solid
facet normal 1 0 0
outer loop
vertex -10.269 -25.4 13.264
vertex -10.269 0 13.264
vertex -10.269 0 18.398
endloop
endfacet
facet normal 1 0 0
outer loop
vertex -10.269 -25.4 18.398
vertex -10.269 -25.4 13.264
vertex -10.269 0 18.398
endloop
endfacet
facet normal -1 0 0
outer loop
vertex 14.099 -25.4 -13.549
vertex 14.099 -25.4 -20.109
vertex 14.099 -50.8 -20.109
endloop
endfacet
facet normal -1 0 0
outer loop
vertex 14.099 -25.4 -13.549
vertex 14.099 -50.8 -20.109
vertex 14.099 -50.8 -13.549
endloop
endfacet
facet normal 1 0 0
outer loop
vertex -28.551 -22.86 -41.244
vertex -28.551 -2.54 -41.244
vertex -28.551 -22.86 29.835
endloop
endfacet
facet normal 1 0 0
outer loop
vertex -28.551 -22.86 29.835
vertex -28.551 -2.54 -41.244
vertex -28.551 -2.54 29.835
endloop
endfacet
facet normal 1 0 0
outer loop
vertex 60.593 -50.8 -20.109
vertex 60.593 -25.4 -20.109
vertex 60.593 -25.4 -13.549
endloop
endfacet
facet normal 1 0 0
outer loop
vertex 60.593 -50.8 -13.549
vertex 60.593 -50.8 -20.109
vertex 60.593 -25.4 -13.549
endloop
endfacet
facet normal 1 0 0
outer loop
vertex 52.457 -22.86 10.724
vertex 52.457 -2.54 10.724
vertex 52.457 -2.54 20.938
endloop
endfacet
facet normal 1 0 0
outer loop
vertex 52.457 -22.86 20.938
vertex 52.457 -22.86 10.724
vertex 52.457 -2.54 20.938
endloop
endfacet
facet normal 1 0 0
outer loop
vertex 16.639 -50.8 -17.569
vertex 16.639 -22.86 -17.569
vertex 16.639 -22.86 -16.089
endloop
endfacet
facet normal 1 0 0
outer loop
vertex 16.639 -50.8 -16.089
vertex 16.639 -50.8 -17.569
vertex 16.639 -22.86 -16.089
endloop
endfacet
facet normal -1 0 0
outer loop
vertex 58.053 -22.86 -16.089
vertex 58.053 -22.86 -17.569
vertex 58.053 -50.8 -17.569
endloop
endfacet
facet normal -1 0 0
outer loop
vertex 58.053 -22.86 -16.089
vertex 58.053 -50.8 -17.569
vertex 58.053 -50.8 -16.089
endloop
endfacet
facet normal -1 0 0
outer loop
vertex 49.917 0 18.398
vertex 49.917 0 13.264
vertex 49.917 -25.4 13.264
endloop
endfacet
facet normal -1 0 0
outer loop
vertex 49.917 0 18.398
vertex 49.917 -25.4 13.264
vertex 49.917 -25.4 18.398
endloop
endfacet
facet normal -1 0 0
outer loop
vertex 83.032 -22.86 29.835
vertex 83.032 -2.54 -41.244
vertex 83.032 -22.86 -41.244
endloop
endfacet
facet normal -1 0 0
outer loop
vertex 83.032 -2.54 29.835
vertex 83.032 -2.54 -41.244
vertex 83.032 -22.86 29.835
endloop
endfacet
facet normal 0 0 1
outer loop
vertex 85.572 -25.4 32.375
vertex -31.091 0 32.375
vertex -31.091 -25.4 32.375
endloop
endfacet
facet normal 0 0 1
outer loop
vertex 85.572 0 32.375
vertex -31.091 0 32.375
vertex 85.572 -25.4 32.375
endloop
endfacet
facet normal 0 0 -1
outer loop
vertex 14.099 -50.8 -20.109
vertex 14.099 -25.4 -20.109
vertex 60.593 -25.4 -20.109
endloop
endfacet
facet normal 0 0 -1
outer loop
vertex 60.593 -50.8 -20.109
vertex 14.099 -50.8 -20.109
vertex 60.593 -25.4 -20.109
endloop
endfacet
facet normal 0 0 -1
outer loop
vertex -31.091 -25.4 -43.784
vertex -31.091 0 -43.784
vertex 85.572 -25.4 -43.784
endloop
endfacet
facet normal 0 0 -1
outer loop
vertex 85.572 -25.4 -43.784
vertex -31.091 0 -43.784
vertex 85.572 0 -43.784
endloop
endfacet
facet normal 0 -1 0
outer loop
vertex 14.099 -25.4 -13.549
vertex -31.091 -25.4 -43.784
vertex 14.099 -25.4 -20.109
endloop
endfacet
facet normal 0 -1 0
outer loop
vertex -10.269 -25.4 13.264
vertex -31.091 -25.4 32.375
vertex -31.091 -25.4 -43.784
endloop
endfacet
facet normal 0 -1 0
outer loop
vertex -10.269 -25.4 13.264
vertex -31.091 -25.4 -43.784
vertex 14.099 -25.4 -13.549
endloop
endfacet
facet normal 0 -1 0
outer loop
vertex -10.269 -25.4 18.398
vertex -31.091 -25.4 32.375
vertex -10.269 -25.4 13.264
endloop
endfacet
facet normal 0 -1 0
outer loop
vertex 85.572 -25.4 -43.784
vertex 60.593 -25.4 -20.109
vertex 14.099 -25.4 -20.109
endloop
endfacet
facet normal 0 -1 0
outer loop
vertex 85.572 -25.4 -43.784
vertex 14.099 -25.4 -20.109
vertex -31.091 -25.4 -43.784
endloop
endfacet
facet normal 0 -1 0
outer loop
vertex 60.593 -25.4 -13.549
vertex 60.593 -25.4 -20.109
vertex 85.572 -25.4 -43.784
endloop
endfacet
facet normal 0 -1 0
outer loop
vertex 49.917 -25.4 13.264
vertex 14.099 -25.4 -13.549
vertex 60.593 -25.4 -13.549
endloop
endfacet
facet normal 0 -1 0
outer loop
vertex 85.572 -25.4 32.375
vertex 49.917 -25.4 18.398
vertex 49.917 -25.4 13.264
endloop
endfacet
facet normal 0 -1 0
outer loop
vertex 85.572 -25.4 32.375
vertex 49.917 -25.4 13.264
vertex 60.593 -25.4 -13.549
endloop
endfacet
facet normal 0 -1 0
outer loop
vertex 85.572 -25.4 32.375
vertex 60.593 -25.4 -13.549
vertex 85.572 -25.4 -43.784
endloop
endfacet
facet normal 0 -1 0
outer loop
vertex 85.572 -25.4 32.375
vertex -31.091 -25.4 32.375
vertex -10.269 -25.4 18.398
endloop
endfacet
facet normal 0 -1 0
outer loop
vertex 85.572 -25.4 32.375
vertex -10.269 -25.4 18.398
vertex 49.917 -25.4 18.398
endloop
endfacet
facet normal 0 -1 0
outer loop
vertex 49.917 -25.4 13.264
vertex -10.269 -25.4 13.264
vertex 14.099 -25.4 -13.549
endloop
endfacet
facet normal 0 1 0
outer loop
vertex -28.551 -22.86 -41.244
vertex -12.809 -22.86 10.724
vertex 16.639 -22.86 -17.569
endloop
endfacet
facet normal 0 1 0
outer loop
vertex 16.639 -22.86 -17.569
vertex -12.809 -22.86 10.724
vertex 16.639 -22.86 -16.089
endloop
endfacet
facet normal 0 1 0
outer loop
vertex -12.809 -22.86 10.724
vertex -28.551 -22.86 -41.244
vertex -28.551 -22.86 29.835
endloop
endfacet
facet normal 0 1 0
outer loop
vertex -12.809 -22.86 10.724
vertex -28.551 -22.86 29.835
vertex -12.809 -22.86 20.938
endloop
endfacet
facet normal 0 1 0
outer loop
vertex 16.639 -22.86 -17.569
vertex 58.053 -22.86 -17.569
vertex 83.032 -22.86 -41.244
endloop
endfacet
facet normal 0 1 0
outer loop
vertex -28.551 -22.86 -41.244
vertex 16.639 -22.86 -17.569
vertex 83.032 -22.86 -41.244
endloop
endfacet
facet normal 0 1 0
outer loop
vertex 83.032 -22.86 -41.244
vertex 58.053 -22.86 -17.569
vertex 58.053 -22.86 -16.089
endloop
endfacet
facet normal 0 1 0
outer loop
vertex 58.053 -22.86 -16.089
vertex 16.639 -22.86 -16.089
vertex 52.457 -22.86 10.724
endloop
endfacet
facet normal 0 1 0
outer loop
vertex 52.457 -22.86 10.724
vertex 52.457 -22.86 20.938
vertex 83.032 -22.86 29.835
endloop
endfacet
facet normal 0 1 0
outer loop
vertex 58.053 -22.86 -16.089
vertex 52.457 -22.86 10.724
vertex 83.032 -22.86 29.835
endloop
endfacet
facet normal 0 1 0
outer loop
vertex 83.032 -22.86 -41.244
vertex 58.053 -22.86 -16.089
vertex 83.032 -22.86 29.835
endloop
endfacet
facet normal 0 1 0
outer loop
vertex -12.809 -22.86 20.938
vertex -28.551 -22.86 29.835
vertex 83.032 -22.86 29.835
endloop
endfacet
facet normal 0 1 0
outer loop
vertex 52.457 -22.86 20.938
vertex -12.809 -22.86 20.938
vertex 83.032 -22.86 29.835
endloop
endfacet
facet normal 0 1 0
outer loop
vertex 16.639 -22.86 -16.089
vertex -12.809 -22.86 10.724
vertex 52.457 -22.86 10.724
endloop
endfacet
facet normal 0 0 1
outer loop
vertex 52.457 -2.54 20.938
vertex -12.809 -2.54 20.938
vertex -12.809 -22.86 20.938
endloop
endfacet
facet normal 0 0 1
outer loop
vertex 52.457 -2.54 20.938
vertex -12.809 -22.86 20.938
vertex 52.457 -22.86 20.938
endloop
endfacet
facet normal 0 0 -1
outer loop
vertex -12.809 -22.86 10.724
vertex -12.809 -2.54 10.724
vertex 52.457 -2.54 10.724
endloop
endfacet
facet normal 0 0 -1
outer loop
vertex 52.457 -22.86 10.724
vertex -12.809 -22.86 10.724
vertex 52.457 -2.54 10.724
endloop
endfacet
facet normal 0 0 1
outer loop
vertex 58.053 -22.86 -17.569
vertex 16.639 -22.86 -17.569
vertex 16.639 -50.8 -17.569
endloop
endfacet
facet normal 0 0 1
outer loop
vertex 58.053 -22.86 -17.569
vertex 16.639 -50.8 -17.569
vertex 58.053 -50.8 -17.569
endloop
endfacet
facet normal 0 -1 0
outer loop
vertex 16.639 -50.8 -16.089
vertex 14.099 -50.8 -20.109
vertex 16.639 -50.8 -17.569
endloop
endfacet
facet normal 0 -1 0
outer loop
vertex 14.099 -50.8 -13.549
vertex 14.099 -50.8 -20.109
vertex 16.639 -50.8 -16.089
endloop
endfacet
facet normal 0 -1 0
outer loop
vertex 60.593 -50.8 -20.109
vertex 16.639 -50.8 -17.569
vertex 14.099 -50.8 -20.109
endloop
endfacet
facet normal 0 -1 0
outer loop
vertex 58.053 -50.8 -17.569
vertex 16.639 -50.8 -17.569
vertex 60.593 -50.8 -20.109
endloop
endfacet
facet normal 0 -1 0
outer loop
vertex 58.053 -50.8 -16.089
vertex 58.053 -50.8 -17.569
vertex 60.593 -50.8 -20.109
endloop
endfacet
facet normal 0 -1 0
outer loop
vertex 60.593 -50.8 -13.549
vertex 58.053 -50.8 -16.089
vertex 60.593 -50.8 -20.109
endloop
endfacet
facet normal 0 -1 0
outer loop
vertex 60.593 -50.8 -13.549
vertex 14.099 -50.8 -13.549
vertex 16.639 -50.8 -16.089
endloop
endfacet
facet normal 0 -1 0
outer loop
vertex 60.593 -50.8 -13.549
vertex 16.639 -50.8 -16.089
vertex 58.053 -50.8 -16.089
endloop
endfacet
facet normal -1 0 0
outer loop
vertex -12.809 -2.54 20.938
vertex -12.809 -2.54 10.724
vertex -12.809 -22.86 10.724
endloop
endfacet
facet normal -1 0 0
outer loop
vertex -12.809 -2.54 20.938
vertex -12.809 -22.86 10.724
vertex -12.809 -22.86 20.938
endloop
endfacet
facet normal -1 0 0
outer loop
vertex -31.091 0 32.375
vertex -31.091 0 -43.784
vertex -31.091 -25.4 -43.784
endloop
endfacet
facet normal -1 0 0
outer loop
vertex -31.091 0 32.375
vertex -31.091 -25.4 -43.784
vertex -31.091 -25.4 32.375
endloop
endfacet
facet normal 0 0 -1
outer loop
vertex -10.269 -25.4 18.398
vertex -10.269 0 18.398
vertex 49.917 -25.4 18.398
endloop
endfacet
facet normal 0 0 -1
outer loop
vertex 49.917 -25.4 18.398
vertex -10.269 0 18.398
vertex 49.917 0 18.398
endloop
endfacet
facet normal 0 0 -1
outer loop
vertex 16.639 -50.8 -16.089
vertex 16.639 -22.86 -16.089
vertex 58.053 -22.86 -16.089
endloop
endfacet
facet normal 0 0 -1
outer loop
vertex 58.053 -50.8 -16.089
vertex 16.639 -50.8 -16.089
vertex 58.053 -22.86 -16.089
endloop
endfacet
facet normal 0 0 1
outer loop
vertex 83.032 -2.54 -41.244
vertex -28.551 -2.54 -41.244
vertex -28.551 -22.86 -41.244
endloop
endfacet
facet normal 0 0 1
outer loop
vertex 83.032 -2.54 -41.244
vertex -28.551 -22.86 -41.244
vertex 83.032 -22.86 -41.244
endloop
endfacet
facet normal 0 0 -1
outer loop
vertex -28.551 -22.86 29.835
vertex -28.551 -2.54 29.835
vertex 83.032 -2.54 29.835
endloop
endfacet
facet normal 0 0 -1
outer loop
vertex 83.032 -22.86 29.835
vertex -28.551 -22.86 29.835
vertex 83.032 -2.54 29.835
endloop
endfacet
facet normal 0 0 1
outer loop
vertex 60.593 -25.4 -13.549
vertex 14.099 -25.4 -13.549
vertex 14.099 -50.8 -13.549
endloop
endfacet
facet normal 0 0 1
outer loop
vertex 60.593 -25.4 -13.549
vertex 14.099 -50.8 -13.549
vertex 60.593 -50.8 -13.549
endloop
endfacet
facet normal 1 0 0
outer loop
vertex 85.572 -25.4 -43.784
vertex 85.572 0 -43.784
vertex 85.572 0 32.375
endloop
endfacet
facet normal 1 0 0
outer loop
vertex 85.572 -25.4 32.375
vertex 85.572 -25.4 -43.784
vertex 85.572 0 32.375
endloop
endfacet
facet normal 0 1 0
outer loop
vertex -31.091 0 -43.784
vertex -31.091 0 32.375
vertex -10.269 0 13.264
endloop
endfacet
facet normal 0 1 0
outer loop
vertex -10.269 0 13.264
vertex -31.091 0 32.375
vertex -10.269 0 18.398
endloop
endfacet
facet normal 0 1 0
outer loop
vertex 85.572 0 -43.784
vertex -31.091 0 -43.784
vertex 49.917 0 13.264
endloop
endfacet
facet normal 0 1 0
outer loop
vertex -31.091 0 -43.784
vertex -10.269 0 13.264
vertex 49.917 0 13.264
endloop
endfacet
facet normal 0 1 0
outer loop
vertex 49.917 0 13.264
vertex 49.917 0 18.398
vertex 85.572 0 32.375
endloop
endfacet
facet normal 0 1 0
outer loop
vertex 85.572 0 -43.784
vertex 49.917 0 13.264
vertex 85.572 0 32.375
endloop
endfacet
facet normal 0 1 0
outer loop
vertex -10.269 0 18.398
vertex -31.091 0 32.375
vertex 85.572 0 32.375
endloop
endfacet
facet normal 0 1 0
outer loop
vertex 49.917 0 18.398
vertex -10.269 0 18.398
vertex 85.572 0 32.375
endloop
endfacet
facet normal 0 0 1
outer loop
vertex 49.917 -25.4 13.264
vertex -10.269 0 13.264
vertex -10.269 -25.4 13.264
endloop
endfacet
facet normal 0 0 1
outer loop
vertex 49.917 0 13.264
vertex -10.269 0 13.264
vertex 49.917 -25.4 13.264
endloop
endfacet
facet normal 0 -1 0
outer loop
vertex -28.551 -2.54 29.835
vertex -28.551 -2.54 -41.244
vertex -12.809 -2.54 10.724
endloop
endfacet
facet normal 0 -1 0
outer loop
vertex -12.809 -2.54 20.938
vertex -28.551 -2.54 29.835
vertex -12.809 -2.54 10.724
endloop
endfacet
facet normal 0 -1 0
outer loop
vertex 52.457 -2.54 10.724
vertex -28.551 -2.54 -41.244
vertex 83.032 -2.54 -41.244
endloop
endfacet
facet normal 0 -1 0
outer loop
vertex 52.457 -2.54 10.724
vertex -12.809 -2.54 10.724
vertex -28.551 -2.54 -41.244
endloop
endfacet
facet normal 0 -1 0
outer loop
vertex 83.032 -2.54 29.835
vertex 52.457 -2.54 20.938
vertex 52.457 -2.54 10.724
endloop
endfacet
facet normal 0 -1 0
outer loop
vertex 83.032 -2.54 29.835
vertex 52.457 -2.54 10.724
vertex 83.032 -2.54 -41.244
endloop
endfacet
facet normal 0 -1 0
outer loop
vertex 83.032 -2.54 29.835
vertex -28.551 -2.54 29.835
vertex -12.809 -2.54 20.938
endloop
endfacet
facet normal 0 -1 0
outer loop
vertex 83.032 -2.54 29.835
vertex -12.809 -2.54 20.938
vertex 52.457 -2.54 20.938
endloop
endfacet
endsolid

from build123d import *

# Parameters (mm, degrees)
F0_W     = 116.6634205729
F0_H     = 76.1592537165
F0_W_2   = 60.1857760921
F0_H_2   = 5.1343319938
F1_DEPTH = 25.4
F2_W     = 46.4942213148
F2_H     = 6.5605351701
F3_DEPTH = 25.4
F4_T     = -2.54


with BuildPart() as f1:
    # F0 (on Front) → F1 (new body)
    with BuildSketch(Plane.XZ):
        with Locations((27.2404802963, -5.7048127055)):
            Rectangle(F0_W, F0_H)
        with Locations((19.8242249899, 15.8308562823)):
            Rectangle(F0_W_2, F0_H_2, mode=Mode.SUBTRACT)
    extrude(amount=F1_DEPTH)

    # F2 (on face) → F3 (join)
    with BuildSketch(Plane.XZ.offset(25.4)):
        with Locations((37.3461479321, -16.8291977607)):
            Rectangle(F2_W, F2_H)
    extrude(amount=F3_DEPTH)

    # F4
    f4_openings = [f1.faces().sort_by_distance(p)[0] for p in [
        (37.346148, -50.8, -16.829198),
    ]]
    offset(amount=F4_T, openings=f4_openings, kind=Kind.INTERSECTION)


solid = f1.part
